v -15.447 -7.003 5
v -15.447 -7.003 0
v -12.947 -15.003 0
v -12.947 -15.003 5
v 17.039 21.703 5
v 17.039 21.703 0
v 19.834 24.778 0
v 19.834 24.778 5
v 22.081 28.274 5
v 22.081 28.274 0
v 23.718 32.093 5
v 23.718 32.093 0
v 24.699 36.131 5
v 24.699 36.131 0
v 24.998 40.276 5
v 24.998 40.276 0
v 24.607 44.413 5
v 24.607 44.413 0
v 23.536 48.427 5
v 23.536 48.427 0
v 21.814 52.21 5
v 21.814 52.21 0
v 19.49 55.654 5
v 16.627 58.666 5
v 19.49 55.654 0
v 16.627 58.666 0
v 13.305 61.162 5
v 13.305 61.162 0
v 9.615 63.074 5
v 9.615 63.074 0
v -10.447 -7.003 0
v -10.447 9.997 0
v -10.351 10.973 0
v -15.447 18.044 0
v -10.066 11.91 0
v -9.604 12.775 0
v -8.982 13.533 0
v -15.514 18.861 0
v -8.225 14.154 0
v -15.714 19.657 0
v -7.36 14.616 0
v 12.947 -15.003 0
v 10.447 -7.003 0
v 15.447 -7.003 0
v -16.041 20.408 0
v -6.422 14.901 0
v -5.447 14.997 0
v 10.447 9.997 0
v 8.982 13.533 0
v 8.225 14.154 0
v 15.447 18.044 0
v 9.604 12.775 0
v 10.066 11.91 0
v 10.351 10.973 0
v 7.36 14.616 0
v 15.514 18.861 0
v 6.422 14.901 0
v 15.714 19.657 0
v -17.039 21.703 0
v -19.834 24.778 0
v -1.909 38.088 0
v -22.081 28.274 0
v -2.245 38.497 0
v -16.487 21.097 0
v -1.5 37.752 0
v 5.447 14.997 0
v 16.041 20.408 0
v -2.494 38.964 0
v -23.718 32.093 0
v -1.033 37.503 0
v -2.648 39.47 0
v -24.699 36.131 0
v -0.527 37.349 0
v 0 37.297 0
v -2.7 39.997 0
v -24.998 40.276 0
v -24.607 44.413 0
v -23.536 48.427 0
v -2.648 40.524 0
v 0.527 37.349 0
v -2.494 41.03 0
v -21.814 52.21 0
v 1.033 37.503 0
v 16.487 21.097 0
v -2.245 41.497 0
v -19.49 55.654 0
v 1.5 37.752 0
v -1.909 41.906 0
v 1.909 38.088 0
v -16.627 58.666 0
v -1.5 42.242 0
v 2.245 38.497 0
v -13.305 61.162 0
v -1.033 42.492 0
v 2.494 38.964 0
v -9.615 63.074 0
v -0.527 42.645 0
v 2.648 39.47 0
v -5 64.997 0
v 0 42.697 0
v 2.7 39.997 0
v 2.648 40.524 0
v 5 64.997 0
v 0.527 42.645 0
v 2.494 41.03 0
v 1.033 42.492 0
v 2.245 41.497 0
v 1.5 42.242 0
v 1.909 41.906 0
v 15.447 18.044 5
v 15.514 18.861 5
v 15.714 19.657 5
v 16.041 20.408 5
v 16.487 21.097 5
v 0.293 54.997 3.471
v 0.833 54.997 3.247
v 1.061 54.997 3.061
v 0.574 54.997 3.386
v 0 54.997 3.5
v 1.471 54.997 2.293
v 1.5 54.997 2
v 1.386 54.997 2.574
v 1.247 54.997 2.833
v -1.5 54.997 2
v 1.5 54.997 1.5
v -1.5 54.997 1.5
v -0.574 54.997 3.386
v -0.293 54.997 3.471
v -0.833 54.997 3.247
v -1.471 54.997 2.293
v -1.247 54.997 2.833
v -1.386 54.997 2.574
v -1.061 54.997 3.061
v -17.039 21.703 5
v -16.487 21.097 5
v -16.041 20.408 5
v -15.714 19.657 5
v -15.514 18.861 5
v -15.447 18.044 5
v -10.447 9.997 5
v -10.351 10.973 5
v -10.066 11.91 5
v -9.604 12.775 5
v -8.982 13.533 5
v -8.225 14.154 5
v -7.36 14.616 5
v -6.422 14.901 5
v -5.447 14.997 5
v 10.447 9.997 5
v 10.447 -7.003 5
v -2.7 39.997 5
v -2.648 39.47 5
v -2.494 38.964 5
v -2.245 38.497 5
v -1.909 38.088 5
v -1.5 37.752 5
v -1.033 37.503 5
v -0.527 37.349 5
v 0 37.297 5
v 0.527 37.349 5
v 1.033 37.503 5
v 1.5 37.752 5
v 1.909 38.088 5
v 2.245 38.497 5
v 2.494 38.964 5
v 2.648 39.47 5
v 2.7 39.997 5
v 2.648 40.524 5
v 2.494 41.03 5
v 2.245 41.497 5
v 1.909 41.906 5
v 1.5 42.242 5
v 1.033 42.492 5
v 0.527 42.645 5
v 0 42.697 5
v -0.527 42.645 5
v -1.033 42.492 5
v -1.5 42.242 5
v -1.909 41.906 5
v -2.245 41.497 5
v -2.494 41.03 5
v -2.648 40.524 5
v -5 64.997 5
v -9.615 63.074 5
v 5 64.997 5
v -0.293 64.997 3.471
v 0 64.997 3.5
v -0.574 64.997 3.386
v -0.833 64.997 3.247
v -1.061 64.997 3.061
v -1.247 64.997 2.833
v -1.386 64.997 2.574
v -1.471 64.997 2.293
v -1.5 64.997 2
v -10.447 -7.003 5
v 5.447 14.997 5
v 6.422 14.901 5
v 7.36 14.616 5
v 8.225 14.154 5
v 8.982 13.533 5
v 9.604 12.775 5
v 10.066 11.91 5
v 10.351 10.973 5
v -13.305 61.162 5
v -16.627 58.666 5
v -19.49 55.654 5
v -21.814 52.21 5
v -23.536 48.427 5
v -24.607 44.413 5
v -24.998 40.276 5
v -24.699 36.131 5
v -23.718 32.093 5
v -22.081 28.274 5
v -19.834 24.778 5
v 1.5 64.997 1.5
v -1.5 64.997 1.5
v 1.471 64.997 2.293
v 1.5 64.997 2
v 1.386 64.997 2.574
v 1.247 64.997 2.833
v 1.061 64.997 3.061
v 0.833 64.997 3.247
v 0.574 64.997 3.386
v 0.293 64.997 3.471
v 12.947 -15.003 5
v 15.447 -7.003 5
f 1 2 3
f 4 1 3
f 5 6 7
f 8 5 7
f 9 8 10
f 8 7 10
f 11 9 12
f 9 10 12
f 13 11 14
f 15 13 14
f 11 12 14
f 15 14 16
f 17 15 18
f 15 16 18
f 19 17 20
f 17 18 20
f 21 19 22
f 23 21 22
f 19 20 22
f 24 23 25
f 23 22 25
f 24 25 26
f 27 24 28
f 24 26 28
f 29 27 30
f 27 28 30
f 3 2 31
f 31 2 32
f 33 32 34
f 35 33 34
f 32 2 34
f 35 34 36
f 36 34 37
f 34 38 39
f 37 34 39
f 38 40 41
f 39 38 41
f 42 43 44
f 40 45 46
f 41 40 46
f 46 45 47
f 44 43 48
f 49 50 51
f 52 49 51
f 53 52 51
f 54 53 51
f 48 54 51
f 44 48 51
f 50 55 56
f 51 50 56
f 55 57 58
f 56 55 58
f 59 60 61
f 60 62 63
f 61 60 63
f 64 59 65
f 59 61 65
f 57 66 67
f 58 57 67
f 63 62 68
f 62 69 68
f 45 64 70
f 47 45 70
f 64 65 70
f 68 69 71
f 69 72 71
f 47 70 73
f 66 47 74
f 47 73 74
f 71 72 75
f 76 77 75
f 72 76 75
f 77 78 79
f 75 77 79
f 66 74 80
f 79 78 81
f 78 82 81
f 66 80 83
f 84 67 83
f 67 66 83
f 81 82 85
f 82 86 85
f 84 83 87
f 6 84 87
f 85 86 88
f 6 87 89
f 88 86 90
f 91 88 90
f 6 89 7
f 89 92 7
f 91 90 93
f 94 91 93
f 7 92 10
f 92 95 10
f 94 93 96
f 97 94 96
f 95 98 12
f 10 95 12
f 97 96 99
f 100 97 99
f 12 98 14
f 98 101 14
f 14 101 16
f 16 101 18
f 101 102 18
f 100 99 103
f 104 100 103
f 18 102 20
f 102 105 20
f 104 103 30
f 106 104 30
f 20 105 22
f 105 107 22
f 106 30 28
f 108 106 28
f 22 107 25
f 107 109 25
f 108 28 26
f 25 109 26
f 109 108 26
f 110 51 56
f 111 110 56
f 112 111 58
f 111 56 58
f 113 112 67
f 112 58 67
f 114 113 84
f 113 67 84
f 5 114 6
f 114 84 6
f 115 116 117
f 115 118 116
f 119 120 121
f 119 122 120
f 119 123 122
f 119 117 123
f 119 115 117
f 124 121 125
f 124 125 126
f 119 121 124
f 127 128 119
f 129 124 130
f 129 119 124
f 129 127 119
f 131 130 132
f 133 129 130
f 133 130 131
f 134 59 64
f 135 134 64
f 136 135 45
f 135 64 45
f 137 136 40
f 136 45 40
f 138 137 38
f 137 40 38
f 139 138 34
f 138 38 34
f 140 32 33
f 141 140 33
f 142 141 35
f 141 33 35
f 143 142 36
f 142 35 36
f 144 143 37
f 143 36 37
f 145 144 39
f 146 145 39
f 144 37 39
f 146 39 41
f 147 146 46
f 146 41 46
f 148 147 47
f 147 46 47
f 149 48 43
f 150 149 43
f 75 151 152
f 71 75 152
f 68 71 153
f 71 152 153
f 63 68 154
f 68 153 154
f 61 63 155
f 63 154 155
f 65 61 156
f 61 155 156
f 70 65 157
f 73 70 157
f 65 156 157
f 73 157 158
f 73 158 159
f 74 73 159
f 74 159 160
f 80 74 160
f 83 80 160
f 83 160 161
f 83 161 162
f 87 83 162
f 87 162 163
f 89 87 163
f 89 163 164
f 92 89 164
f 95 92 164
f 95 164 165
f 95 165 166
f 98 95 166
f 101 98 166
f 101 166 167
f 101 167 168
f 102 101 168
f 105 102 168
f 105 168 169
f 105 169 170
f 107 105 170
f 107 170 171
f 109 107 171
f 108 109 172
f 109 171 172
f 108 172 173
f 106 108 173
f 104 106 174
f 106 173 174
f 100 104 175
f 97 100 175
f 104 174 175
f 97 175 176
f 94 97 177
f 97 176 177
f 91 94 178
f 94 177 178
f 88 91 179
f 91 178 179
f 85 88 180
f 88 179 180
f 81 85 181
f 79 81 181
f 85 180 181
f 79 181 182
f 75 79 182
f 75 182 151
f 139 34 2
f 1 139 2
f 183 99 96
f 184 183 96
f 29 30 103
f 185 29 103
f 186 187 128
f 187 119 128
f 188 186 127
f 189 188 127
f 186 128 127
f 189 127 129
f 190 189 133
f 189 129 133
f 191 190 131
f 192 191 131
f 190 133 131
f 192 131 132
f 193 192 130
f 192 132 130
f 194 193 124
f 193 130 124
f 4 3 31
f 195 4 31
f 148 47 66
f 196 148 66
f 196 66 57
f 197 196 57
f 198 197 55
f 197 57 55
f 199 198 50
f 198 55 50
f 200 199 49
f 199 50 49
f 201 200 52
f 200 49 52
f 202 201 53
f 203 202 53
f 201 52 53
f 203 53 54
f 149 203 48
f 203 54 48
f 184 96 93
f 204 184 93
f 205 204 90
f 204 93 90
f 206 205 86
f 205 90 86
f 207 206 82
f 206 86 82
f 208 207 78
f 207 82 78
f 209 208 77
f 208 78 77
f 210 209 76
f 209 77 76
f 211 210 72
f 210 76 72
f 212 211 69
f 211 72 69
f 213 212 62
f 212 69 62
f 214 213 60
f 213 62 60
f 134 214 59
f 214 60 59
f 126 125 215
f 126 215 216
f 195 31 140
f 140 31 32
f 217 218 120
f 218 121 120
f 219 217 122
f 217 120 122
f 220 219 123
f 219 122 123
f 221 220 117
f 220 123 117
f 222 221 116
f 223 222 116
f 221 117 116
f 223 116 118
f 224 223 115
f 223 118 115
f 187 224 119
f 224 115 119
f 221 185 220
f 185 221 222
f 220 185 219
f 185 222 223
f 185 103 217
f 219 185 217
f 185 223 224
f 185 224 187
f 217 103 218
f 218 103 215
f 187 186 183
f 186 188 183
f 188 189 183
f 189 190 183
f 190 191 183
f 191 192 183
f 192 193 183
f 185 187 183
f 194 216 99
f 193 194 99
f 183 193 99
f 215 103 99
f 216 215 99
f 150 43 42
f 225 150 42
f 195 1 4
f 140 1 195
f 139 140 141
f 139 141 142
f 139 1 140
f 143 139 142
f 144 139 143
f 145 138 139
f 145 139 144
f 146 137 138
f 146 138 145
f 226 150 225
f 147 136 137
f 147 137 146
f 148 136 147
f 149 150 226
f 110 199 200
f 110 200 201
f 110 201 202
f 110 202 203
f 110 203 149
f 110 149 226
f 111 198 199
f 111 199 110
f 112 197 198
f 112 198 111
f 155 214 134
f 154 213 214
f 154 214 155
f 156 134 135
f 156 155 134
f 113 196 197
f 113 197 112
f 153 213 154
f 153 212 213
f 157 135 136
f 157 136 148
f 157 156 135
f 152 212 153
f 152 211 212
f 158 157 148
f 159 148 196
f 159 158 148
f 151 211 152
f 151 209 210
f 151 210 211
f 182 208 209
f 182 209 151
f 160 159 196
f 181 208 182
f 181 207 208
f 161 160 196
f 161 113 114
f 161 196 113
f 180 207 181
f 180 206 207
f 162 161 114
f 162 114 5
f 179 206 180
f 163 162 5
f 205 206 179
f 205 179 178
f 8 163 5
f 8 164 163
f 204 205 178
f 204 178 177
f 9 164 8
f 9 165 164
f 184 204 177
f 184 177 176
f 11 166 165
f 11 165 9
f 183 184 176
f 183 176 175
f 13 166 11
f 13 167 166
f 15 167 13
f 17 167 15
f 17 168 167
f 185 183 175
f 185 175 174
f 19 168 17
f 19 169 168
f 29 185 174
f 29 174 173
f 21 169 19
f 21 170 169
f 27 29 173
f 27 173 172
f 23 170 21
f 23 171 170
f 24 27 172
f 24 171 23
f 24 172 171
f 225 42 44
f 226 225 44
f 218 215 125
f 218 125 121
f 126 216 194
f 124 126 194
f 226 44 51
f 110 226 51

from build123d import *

# Parameters (mm, degrees)
F1_DEPTH = 5
F2_D     = 5.4
F3_W     = 3
F3_H     = 2
F4_DEPTH = 10
F5_R     = 1.49999


# Not quite as in the source:
# - a fillet or chamfer is up to 0.001 mm smaller than in the source, because OpenCascade refuses the exact size


with BuildPart() as f1:
    # F0 (on Top) → F1 (new body)
    with BuildSketch(Plane.XY):
        with BuildLine():
            ThreePointArc((-17.0389572543, 21.7029743907), (-15.8620482104, 20.0392796609), (-15.4467487052, 18.0441552605))
            Line((-15.4467487052, 18.0441552605), (-15.4467487052, -7.0029299584))
            Line((-15.4467487052, -7.0029299584), (-12.9467487052, -15.0029299584))
            Line((-12.9467487052, -15.0029299584), (-10.4467487052, -7.0029299584))
            Line((-10.4467487052, -7.0029299584), (-10.4467487052, 9.9970700416))
            ThreePointArc((-10.4467487052, 9.9970700416), (-8.9822826112, 13.5326039476), (-5.4467487052, 14.9970700416))
            Line((-5.4467487052, 14.9970700416), (0, 14.9970700416))
            Line((0, 14.9970700416), (0, 37.4970700416))
            ThreePointArc((0, 37.4970700416), (-2.5, 39.9970700416), (0, 42.4970700416))
            Line((0, 42.4970700416), (0, 64.9970700416))
            Line((0, 64.9970700416), (-5, 64.9970700416))
            Line((-5, 64.9970700416), (-9.6153846154, 63.0739931186))
            ThreePointArc((-9.6153846154, 63.0739931186), (-24.6069864626, 44.4125221395), (-17.0389572543, 21.7029743907))
        make_face()
        with BuildLine():
            Line((0, 37.4970700416), (0, 42.4970700416))
            ThreePointArc((0, 42.4970700416), (-2.5, 39.9970700416), (0, 37.4970700416))
        make_face()
        with BuildLine():
            Line((5, 64.9970700416), (0, 64.9970700416))
            Line((0, 64.9970700416), (0, 42.4970700416))
            ThreePointArc((0, 42.4970700416), (2.5, 39.9970700416), (0, 37.4970700416))
            Line((0, 37.4970700416), (0, 14.9970700416))
            Line((0, 14.9970700416), (5.4467487052, 14.9970700416))
            ThreePointArc((5.4467487052, 14.9970700416), (8.9822826112, 13.5326039476), (10.4467487052, 9.9970700416))
            Line((10.4467487052, 9.9970700416), (10.4467487052, -7.0029299584))
            Line((10.4467487052, -7.0029299584), (12.9467487052, -15.0029299584))
            Line((12.9467487052, -15.0029299584), (15.4467487052, -7.0029299584))
            Line((15.4467487052, -7.0029299584), (15.4467487052, 18.0441552605))
            ThreePointArc((15.4467487052, 18.0441552605), (15.8620482104, 20.0392796609), (17.0389572543, 21.7029743907))
            ThreePointArc((17.0389572543, 21.7029743907), (24.6069864626, 44.4125221395), (9.6153846154, 63.0739931186))
            Line((9.6153846154, 63.0739931186), (5, 64.9970700416))
        make_face()
        with BuildLine():
            ThreePointArc((0, 37.4970700416), (2.5, 39.9970700416), (0, 42.4970700416))
            Line((0, 42.4970700416), (0, 37.4970700416))
        make_face()
    extrude(amount=F1_DEPTH)

    # F2 (through all)
    with Locations(Plane(origin=(0, 0, 0), x_dir=(1, 0, 0), z_dir=(0, 0, -1))):
        with Locations((0, -39.9970700416)):
            Hole(F2_D / 2)

    # F3 (on face) → F4 (cut)
    with BuildSketch(Plane(origin=(0, 64.9970700416, 0), x_dir=(-1, 0, 0), z_dir=(0, 1, 0))):
        with Locations((0, 2.5)):
            Rectangle(F3_W, F3_H)
    extrude(amount=-F4_DEPTH, mode=Mode.SUBTRACT)

    # F5 (radius 1.5 in the source; OpenCascade refuses exactly that, so slightly less here)
    f5_edges = [f1.edges().sort_by_distance(p)[0] for p in [
        (1.5, 59.99707, 3.5),
        (-1.5, 59.99707, 3.5),
    ]]
    fillet(f5_edges, radius=F5_R)


solid = f1.part
